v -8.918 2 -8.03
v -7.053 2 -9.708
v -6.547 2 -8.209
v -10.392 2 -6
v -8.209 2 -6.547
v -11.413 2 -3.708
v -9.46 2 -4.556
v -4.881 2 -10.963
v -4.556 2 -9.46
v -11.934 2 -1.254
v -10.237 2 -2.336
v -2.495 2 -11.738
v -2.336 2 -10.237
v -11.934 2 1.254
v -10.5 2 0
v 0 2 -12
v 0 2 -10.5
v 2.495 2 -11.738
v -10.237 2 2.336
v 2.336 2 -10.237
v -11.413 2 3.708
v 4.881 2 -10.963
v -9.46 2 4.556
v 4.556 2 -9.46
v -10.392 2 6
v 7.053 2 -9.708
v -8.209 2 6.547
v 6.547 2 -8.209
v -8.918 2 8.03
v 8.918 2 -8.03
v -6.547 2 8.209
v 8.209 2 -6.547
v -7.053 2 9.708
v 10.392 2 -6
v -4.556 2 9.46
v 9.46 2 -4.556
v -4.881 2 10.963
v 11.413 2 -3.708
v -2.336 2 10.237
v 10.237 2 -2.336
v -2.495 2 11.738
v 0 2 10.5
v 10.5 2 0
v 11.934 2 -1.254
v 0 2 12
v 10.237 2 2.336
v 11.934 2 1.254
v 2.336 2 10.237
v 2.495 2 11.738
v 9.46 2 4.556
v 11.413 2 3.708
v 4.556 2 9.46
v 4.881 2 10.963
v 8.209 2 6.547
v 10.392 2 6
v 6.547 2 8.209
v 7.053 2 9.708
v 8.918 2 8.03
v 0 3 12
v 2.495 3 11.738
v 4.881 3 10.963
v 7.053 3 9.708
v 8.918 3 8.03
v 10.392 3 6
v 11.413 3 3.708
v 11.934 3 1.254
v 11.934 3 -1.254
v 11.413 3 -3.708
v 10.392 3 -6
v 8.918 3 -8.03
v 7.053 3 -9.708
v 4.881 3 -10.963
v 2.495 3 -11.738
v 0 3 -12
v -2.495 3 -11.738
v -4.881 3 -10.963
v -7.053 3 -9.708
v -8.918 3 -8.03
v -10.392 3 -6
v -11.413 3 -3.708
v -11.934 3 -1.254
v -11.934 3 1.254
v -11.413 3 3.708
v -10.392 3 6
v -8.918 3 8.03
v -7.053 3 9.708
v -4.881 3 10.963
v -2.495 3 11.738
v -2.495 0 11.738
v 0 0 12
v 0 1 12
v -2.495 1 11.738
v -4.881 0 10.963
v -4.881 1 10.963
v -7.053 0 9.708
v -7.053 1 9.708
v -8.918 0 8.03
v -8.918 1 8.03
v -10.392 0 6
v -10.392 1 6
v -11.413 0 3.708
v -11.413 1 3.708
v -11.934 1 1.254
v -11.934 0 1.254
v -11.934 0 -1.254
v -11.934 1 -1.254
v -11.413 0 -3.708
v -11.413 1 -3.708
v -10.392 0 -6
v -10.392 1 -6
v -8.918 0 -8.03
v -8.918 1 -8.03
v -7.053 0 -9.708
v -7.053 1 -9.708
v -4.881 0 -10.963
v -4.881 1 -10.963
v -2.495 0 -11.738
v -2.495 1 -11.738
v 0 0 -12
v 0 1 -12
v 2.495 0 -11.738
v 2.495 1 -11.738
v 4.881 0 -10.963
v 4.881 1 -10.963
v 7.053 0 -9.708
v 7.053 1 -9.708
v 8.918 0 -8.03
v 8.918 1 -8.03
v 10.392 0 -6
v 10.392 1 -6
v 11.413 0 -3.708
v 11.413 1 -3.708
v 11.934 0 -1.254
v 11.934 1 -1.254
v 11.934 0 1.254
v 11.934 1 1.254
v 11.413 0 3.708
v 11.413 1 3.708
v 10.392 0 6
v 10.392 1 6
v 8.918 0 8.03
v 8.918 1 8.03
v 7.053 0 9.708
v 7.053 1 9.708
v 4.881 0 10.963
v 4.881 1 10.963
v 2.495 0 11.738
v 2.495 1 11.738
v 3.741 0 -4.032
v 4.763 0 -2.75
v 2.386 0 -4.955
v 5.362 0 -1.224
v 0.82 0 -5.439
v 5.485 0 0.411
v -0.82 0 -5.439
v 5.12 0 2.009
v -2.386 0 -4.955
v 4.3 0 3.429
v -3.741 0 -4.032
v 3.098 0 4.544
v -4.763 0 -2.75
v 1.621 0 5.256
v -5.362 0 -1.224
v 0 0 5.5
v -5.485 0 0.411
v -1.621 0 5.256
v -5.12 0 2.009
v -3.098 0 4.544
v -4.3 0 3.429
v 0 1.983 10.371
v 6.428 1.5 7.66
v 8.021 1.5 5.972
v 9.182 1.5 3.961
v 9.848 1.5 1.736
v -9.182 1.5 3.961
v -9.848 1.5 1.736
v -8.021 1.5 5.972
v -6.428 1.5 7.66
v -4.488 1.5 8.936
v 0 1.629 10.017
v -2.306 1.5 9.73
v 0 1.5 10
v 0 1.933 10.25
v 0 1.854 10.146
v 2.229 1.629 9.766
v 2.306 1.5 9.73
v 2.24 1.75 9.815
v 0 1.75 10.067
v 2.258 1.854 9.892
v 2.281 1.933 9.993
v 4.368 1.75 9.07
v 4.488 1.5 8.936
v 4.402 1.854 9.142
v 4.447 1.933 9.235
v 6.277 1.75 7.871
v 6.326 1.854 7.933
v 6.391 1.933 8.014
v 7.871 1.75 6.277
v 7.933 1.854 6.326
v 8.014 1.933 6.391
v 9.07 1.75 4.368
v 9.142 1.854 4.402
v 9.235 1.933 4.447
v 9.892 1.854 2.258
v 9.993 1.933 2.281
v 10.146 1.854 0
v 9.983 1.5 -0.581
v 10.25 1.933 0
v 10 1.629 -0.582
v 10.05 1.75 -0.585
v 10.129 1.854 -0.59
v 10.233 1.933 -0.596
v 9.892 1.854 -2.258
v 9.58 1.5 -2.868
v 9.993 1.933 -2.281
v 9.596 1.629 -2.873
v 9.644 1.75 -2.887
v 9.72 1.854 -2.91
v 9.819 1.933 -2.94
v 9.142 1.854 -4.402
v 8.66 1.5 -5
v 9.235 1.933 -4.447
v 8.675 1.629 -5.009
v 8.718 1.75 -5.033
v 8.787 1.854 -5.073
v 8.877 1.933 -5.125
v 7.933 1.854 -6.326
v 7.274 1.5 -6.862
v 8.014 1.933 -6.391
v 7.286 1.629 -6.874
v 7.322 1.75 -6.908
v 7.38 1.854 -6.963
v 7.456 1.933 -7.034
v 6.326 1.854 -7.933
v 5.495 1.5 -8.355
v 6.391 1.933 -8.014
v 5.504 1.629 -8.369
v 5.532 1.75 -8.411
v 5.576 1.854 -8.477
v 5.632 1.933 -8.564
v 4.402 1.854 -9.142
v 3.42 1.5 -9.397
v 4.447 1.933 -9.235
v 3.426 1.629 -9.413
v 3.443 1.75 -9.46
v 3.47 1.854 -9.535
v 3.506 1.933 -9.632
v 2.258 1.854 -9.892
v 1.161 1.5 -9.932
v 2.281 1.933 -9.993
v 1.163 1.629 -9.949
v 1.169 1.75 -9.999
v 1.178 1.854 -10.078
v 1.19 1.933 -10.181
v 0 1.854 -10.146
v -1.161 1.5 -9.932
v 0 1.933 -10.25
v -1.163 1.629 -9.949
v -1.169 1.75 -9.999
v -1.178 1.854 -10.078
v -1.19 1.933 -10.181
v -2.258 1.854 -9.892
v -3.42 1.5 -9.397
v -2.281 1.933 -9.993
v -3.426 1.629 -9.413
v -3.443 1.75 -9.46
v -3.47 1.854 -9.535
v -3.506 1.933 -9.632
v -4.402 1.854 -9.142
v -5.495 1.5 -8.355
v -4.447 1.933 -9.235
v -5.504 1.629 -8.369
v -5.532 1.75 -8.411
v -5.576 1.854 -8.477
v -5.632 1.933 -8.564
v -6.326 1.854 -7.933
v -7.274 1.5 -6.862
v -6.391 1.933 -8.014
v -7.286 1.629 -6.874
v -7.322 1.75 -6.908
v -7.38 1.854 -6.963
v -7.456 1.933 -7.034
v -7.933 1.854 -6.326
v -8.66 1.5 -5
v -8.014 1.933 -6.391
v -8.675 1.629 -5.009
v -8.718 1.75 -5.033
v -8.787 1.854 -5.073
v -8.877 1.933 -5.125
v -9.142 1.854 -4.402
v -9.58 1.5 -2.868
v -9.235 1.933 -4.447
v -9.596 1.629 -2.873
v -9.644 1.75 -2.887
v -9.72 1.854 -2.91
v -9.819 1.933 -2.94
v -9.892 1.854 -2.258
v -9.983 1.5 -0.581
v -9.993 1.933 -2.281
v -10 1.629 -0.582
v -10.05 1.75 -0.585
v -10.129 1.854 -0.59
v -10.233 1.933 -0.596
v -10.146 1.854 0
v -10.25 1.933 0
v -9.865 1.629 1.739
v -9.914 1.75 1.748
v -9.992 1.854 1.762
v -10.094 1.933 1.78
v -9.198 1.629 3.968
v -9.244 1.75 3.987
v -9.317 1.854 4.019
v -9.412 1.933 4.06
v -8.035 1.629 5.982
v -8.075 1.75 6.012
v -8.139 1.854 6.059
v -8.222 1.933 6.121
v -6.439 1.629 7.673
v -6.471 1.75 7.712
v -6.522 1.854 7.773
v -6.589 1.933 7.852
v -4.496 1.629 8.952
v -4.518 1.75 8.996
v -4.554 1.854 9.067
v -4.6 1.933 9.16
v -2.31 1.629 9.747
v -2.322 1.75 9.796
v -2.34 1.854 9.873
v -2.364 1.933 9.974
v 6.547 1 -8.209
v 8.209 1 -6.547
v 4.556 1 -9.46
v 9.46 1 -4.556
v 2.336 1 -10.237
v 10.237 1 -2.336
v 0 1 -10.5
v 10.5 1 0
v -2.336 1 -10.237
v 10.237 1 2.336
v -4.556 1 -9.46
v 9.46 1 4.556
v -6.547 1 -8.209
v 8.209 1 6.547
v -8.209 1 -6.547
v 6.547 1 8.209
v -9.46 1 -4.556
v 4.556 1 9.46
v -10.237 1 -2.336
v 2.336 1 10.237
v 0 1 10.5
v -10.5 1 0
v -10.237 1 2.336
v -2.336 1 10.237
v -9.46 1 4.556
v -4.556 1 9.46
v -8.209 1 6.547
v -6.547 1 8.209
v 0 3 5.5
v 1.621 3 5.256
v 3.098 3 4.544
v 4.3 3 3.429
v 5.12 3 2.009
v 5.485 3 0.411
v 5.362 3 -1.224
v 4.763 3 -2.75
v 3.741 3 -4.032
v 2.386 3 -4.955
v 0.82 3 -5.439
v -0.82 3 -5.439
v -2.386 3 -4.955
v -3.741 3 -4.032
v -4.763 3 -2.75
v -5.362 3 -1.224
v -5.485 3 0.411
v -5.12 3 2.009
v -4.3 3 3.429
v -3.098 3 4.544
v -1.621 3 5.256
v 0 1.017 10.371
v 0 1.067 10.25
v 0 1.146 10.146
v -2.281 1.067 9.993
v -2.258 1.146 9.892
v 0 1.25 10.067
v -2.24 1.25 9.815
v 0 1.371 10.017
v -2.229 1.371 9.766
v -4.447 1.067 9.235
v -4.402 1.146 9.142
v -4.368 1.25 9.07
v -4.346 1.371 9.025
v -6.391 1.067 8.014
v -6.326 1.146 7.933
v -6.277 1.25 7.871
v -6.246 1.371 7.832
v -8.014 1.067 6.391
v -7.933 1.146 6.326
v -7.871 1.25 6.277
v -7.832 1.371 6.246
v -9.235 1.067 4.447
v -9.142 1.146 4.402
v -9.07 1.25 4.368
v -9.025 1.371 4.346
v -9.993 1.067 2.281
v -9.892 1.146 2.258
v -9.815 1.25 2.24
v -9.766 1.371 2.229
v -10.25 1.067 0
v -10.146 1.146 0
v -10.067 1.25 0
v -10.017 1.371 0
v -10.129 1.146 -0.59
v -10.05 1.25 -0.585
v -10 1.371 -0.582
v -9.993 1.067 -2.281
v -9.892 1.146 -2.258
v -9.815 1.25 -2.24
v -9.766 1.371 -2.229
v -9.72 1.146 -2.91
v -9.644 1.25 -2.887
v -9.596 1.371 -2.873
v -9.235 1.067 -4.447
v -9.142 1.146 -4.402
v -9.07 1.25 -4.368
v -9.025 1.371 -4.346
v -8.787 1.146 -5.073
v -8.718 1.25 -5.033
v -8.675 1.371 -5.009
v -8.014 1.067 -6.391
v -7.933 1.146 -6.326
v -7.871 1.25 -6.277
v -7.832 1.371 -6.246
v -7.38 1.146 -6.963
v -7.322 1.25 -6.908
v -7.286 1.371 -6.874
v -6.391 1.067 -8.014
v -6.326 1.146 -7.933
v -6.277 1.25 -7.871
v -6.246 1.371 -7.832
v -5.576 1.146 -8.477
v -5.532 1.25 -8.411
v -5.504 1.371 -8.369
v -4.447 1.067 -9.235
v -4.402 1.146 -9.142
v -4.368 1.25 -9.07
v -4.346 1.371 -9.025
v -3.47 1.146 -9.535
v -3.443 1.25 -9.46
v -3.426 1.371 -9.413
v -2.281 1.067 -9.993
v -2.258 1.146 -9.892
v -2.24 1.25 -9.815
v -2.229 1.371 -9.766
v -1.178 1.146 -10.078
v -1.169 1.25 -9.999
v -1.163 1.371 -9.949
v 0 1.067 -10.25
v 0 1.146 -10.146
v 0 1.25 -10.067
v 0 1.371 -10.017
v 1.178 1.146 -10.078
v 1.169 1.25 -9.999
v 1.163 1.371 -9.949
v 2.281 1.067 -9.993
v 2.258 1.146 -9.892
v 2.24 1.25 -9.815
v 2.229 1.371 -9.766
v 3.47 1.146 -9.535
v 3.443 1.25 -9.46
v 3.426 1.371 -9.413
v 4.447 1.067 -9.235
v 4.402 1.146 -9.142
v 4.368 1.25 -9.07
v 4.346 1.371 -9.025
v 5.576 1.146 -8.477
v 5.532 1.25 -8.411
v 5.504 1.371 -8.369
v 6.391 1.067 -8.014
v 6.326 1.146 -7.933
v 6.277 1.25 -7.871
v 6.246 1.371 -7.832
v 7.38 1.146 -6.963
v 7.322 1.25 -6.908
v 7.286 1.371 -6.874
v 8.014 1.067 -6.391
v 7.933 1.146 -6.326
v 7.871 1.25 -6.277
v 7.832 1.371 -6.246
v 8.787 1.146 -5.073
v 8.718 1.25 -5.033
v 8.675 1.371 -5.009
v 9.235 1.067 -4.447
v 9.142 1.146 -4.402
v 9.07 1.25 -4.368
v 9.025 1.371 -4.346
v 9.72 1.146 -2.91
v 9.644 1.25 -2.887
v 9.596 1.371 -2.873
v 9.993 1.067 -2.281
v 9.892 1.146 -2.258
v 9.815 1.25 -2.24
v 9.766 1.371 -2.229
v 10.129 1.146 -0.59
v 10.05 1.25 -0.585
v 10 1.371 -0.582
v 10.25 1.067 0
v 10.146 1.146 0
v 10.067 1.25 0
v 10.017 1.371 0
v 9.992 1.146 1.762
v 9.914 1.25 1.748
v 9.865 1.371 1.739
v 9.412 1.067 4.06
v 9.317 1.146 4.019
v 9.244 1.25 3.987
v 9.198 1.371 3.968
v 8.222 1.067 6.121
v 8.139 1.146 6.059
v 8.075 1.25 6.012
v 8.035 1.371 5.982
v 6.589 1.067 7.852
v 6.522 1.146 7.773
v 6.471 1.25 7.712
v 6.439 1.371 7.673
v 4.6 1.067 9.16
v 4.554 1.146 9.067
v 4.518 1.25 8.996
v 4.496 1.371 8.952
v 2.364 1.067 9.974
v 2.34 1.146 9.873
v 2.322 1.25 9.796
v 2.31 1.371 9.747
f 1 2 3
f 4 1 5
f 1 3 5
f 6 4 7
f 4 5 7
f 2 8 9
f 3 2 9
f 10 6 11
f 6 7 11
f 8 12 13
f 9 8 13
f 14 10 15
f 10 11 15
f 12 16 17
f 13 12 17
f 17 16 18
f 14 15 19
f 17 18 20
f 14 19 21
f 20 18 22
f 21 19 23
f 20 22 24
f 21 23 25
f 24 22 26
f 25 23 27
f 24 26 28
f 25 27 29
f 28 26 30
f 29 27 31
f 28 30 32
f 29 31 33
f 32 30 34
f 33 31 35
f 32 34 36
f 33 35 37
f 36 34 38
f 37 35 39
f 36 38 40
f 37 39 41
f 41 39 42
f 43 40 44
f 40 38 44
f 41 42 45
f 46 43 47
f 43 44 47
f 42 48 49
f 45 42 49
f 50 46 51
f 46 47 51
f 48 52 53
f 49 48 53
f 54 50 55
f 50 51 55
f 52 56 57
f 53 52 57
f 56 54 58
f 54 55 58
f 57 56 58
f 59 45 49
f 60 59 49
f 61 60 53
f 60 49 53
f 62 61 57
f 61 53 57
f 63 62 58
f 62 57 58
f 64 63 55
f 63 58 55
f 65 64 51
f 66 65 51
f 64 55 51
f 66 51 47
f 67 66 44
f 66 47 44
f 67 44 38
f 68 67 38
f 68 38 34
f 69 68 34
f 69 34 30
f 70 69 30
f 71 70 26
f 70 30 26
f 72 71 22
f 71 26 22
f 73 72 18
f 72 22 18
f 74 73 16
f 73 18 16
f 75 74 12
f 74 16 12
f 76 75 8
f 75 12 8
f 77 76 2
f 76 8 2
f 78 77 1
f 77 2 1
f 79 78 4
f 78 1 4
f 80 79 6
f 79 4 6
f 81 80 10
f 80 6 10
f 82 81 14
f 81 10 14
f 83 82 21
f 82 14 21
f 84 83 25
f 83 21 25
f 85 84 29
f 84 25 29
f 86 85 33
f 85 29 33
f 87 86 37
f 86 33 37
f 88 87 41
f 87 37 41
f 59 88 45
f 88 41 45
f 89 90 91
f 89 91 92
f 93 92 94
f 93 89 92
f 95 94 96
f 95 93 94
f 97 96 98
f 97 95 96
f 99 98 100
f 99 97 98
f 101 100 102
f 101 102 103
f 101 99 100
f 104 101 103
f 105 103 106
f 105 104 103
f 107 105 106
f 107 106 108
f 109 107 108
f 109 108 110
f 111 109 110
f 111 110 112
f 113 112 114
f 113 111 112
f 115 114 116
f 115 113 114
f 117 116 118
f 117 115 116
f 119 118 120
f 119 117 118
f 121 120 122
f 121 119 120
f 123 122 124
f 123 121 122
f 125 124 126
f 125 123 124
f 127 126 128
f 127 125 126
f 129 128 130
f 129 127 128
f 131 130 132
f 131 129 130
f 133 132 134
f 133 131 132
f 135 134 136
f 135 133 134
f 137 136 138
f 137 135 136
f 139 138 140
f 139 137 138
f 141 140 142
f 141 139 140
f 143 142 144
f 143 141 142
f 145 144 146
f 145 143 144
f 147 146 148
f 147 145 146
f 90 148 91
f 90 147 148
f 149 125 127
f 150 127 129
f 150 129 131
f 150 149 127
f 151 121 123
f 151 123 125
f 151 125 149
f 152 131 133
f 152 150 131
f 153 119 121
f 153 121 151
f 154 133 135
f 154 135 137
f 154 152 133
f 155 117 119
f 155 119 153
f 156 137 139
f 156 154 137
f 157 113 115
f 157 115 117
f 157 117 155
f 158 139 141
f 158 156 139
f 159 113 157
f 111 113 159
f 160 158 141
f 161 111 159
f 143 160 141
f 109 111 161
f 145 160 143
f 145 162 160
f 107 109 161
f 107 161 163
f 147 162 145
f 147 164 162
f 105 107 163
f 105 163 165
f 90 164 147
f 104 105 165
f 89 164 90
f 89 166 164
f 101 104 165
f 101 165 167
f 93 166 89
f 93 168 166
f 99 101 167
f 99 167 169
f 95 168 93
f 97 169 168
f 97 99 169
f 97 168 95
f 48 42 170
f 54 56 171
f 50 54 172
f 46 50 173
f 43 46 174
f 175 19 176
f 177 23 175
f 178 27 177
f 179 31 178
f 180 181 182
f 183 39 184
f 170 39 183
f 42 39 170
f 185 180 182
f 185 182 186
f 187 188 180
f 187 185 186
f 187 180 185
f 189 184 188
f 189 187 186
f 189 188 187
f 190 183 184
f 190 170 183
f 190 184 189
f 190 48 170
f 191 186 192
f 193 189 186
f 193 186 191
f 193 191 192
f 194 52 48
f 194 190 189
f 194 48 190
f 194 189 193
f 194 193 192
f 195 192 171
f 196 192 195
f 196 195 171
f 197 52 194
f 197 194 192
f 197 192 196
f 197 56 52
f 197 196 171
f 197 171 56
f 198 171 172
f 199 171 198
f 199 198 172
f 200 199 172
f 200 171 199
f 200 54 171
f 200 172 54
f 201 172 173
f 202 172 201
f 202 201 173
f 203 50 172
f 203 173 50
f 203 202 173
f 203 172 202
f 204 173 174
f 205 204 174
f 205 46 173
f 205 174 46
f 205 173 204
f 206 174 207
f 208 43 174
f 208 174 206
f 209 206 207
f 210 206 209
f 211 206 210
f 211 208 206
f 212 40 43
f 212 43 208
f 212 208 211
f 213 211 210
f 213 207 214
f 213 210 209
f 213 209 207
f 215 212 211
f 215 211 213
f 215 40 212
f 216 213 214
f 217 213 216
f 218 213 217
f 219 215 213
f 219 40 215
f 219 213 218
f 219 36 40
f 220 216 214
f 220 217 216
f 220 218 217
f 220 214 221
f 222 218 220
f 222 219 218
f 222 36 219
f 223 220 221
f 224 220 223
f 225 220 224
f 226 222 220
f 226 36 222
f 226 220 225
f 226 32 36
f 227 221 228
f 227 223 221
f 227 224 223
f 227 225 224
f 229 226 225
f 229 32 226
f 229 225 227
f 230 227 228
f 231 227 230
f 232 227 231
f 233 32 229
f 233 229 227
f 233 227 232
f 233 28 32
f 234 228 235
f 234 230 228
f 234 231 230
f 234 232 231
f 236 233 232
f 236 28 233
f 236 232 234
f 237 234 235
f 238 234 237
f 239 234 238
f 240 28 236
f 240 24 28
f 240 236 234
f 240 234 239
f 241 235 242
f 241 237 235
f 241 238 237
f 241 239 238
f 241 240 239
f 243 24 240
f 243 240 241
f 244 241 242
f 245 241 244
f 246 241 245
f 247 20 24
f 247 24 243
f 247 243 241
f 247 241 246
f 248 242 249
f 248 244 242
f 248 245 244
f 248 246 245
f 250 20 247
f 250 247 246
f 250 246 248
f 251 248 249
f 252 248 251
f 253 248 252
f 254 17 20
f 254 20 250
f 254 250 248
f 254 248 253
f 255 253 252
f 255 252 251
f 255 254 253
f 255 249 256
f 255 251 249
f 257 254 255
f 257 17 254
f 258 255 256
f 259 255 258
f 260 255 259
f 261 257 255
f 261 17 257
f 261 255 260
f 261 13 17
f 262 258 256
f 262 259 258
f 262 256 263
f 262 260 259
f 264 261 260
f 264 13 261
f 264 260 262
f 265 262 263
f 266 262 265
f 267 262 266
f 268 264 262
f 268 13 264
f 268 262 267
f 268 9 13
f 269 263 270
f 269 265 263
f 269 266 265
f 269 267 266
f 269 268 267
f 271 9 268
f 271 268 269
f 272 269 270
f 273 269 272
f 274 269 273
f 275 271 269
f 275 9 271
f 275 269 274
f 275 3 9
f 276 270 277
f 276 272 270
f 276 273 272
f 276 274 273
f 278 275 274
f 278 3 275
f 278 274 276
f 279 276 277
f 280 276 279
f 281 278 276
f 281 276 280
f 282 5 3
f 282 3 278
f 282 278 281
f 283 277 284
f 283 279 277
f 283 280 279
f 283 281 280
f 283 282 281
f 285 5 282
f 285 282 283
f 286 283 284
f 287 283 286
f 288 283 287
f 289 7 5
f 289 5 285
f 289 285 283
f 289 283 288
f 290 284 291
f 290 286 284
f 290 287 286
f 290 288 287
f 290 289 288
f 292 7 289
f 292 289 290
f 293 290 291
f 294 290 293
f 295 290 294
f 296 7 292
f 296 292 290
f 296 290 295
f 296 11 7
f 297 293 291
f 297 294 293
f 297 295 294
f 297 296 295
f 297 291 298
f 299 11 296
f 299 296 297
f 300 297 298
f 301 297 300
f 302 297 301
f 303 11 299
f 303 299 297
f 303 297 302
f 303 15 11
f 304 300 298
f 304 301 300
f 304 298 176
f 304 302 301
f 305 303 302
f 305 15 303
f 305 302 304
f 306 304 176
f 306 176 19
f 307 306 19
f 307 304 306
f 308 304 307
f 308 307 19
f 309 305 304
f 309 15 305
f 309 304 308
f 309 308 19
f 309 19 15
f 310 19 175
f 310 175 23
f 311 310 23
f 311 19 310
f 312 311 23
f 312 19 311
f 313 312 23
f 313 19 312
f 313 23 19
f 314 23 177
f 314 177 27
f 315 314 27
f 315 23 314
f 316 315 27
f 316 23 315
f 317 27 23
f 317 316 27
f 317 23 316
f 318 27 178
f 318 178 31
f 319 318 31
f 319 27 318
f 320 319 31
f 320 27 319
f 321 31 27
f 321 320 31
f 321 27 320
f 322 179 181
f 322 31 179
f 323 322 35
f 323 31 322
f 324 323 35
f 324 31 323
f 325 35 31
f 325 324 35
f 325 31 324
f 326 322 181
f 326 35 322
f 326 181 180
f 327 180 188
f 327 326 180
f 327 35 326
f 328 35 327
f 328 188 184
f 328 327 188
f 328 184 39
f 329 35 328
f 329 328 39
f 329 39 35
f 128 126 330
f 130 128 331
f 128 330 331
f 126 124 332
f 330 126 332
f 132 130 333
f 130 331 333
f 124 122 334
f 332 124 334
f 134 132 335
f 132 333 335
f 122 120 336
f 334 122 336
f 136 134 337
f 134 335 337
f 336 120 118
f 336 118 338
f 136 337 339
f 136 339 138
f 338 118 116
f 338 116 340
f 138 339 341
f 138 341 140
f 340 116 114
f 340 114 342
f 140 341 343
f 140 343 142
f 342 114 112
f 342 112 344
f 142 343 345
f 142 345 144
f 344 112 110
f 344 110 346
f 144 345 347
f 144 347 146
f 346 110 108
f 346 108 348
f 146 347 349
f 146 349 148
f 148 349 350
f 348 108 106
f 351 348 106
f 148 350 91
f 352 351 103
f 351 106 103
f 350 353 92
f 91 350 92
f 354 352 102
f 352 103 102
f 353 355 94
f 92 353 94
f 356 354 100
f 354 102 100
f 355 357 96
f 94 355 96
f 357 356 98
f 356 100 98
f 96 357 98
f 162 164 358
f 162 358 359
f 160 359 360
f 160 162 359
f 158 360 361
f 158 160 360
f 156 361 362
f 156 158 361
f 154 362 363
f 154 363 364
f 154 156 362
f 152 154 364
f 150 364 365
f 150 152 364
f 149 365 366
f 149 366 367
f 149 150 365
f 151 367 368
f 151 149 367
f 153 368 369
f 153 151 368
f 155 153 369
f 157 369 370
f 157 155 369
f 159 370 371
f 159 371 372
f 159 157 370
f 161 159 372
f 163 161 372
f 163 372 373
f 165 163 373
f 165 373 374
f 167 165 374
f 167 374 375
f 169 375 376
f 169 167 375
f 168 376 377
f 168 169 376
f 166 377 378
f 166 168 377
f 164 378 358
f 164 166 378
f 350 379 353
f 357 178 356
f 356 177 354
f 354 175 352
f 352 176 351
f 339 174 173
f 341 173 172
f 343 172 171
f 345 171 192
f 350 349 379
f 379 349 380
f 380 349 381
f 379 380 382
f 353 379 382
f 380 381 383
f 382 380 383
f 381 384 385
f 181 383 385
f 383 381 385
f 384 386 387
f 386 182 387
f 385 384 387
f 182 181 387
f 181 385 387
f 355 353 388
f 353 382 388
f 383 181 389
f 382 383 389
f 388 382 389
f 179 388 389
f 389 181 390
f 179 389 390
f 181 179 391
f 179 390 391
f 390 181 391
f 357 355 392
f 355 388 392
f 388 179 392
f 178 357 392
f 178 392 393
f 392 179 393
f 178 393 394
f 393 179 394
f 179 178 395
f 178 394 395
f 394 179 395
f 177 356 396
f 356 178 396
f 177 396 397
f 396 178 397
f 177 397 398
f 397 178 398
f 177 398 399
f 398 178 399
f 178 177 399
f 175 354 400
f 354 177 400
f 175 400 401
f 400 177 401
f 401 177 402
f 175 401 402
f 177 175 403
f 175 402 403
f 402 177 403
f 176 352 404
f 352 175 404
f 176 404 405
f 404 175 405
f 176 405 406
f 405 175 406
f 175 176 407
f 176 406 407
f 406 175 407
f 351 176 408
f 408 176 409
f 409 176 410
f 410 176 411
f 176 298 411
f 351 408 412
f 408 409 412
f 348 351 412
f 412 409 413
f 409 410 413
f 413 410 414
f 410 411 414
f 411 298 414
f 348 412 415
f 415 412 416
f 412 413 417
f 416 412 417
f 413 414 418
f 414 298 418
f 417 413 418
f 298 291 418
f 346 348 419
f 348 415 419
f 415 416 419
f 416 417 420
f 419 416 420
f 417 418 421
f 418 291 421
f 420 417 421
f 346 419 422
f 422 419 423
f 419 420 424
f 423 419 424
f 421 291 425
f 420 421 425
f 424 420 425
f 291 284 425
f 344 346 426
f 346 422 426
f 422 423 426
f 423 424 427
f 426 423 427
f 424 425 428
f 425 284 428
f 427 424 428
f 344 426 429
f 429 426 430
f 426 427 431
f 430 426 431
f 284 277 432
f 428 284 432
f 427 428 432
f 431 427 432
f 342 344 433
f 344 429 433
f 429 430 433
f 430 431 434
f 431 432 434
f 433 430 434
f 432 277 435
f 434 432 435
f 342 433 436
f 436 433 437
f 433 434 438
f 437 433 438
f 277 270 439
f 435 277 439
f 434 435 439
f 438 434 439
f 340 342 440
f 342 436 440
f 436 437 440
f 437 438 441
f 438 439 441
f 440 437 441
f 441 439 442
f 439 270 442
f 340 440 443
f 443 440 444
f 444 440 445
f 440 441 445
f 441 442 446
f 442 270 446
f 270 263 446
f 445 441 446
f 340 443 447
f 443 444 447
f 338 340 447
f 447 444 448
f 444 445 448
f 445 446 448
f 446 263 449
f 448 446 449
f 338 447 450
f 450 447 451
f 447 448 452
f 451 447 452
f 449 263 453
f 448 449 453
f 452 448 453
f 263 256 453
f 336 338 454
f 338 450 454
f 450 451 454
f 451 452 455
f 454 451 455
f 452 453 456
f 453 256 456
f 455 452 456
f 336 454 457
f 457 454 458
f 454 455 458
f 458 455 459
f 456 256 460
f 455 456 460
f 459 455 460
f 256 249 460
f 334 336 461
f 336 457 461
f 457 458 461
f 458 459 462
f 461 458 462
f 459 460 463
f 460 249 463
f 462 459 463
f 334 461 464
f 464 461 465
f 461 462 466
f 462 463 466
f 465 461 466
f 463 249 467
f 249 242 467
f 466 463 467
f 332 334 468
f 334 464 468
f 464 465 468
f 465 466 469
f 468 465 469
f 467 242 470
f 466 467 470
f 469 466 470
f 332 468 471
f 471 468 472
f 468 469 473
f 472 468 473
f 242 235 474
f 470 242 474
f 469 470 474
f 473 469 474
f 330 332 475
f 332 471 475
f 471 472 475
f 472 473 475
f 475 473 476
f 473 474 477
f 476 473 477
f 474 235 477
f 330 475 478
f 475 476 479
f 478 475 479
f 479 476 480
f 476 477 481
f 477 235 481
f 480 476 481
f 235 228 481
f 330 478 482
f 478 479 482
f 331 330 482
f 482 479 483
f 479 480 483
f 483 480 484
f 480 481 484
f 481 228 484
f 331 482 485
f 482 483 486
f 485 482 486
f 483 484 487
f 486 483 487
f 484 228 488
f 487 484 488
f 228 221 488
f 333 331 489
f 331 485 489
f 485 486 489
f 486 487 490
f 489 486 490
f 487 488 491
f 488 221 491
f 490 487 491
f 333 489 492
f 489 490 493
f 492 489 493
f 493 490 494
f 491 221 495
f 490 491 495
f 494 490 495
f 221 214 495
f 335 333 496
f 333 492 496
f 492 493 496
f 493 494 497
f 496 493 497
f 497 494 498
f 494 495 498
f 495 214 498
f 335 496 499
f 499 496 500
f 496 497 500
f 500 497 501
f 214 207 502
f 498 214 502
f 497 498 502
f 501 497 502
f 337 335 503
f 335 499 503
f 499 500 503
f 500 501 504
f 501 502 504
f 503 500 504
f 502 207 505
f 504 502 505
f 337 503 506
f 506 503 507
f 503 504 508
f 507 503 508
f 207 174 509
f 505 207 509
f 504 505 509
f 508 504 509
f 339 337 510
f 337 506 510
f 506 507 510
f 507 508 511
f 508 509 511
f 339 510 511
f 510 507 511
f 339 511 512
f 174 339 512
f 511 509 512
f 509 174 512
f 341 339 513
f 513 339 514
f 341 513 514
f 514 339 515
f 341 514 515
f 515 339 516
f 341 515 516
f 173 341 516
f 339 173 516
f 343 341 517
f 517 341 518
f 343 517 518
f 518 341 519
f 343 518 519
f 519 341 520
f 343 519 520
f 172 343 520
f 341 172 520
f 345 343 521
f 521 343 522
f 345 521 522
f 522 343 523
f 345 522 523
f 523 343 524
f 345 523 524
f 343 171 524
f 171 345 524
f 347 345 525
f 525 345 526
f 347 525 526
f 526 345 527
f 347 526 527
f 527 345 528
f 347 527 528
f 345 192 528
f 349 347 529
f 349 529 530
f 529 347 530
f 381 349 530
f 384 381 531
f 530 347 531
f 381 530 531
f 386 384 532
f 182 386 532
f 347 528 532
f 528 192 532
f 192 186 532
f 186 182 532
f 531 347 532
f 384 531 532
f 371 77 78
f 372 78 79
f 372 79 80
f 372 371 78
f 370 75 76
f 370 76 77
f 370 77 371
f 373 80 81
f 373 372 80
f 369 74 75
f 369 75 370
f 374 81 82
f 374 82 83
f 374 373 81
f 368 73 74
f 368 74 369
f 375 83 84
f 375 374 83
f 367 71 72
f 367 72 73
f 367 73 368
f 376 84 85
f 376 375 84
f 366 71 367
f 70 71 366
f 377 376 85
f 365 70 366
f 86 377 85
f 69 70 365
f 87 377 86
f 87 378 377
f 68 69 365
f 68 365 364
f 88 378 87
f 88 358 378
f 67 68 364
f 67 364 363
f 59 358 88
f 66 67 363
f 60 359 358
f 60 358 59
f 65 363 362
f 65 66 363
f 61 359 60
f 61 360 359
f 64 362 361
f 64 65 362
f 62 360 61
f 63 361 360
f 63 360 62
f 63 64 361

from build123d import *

# Parameters (mm, degrees)
SKETCH1_R           = 10
SKETCH1_R_2         = 5.5
BOSS_EXTRUDE1_DEPTH = 3
BOSS_EXTRUDE2_START = -1
SKETCH2_R           = 12
SKETCH2_R_2         = 10
BOSS_EXTRUDE2_DEPTH = 1
SKETCH3_R           = 12
SKETCH3_R_2         = 10
BOSS_EXTRUDE3_DEPTH = 1
FILLET2_R           = 0.5


with BuildPart() as part:
    # Sketch1 → Boss-Extrude1 (new body)
    with BuildSketch(Plane(origin=(0, 0, 0), x_dir=(1, 0, 0), z_dir=(0, 1, 0))):
        with Locations(Location((0, 0, 0), (0, 0, 270))):
            Circle(SKETCH1_R)
        with Locations(Location((0, 0, 0), (0, 0, 270))):
            Circle(SKETCH1_R_2, mode=Mode.SUBTRACT)
    extrude(amount=BOSS_EXTRUDE1_DEPTH)

    # Sketch2 → Boss-Extrude2 (add)
    with BuildSketch(Plane(origin=(0, 3, 0), x_dir=(1, 0, 0), z_dir=(0, 1, 0)).offset(BOSS_EXTRUDE2_START)):
        with Locations(Location((0, 0, 0), (0, 0, 270))):
            Circle(SKETCH2_R)
        with Locations(Location((0, 0, 0), (0, 0, 270))):
            Circle(SKETCH2_R_2, mode=Mode.SUBTRACT)
    extrude(amount=BOSS_EXTRUDE2_DEPTH)

    # Sketch3 → Boss-Extrude3 (add)
    with BuildSketch(Plane.XZ):
        with Locations(Location((0, 0, 0), (0, 0, 90))):
            Circle(SKETCH3_R)
        with Locations(Location((0, 0, 0), (0, 0, 270))):
            Circle(SKETCH3_R_2, mode=Mode.SUBTRACT)
    extrude(amount=-BOSS_EXTRUDE3_DEPTH)

    # Fillet2
    fillet2_edges = [part.edges().sort_by_distance(p)[0] for p in [
        (0, 2, -10),
        (0, 1, -10),
    ]]
    fillet(fillet2_edges, radius=FILLET2_R - 0.0001)  # a hair under: the kernel refuses the full size


solid = part.part
